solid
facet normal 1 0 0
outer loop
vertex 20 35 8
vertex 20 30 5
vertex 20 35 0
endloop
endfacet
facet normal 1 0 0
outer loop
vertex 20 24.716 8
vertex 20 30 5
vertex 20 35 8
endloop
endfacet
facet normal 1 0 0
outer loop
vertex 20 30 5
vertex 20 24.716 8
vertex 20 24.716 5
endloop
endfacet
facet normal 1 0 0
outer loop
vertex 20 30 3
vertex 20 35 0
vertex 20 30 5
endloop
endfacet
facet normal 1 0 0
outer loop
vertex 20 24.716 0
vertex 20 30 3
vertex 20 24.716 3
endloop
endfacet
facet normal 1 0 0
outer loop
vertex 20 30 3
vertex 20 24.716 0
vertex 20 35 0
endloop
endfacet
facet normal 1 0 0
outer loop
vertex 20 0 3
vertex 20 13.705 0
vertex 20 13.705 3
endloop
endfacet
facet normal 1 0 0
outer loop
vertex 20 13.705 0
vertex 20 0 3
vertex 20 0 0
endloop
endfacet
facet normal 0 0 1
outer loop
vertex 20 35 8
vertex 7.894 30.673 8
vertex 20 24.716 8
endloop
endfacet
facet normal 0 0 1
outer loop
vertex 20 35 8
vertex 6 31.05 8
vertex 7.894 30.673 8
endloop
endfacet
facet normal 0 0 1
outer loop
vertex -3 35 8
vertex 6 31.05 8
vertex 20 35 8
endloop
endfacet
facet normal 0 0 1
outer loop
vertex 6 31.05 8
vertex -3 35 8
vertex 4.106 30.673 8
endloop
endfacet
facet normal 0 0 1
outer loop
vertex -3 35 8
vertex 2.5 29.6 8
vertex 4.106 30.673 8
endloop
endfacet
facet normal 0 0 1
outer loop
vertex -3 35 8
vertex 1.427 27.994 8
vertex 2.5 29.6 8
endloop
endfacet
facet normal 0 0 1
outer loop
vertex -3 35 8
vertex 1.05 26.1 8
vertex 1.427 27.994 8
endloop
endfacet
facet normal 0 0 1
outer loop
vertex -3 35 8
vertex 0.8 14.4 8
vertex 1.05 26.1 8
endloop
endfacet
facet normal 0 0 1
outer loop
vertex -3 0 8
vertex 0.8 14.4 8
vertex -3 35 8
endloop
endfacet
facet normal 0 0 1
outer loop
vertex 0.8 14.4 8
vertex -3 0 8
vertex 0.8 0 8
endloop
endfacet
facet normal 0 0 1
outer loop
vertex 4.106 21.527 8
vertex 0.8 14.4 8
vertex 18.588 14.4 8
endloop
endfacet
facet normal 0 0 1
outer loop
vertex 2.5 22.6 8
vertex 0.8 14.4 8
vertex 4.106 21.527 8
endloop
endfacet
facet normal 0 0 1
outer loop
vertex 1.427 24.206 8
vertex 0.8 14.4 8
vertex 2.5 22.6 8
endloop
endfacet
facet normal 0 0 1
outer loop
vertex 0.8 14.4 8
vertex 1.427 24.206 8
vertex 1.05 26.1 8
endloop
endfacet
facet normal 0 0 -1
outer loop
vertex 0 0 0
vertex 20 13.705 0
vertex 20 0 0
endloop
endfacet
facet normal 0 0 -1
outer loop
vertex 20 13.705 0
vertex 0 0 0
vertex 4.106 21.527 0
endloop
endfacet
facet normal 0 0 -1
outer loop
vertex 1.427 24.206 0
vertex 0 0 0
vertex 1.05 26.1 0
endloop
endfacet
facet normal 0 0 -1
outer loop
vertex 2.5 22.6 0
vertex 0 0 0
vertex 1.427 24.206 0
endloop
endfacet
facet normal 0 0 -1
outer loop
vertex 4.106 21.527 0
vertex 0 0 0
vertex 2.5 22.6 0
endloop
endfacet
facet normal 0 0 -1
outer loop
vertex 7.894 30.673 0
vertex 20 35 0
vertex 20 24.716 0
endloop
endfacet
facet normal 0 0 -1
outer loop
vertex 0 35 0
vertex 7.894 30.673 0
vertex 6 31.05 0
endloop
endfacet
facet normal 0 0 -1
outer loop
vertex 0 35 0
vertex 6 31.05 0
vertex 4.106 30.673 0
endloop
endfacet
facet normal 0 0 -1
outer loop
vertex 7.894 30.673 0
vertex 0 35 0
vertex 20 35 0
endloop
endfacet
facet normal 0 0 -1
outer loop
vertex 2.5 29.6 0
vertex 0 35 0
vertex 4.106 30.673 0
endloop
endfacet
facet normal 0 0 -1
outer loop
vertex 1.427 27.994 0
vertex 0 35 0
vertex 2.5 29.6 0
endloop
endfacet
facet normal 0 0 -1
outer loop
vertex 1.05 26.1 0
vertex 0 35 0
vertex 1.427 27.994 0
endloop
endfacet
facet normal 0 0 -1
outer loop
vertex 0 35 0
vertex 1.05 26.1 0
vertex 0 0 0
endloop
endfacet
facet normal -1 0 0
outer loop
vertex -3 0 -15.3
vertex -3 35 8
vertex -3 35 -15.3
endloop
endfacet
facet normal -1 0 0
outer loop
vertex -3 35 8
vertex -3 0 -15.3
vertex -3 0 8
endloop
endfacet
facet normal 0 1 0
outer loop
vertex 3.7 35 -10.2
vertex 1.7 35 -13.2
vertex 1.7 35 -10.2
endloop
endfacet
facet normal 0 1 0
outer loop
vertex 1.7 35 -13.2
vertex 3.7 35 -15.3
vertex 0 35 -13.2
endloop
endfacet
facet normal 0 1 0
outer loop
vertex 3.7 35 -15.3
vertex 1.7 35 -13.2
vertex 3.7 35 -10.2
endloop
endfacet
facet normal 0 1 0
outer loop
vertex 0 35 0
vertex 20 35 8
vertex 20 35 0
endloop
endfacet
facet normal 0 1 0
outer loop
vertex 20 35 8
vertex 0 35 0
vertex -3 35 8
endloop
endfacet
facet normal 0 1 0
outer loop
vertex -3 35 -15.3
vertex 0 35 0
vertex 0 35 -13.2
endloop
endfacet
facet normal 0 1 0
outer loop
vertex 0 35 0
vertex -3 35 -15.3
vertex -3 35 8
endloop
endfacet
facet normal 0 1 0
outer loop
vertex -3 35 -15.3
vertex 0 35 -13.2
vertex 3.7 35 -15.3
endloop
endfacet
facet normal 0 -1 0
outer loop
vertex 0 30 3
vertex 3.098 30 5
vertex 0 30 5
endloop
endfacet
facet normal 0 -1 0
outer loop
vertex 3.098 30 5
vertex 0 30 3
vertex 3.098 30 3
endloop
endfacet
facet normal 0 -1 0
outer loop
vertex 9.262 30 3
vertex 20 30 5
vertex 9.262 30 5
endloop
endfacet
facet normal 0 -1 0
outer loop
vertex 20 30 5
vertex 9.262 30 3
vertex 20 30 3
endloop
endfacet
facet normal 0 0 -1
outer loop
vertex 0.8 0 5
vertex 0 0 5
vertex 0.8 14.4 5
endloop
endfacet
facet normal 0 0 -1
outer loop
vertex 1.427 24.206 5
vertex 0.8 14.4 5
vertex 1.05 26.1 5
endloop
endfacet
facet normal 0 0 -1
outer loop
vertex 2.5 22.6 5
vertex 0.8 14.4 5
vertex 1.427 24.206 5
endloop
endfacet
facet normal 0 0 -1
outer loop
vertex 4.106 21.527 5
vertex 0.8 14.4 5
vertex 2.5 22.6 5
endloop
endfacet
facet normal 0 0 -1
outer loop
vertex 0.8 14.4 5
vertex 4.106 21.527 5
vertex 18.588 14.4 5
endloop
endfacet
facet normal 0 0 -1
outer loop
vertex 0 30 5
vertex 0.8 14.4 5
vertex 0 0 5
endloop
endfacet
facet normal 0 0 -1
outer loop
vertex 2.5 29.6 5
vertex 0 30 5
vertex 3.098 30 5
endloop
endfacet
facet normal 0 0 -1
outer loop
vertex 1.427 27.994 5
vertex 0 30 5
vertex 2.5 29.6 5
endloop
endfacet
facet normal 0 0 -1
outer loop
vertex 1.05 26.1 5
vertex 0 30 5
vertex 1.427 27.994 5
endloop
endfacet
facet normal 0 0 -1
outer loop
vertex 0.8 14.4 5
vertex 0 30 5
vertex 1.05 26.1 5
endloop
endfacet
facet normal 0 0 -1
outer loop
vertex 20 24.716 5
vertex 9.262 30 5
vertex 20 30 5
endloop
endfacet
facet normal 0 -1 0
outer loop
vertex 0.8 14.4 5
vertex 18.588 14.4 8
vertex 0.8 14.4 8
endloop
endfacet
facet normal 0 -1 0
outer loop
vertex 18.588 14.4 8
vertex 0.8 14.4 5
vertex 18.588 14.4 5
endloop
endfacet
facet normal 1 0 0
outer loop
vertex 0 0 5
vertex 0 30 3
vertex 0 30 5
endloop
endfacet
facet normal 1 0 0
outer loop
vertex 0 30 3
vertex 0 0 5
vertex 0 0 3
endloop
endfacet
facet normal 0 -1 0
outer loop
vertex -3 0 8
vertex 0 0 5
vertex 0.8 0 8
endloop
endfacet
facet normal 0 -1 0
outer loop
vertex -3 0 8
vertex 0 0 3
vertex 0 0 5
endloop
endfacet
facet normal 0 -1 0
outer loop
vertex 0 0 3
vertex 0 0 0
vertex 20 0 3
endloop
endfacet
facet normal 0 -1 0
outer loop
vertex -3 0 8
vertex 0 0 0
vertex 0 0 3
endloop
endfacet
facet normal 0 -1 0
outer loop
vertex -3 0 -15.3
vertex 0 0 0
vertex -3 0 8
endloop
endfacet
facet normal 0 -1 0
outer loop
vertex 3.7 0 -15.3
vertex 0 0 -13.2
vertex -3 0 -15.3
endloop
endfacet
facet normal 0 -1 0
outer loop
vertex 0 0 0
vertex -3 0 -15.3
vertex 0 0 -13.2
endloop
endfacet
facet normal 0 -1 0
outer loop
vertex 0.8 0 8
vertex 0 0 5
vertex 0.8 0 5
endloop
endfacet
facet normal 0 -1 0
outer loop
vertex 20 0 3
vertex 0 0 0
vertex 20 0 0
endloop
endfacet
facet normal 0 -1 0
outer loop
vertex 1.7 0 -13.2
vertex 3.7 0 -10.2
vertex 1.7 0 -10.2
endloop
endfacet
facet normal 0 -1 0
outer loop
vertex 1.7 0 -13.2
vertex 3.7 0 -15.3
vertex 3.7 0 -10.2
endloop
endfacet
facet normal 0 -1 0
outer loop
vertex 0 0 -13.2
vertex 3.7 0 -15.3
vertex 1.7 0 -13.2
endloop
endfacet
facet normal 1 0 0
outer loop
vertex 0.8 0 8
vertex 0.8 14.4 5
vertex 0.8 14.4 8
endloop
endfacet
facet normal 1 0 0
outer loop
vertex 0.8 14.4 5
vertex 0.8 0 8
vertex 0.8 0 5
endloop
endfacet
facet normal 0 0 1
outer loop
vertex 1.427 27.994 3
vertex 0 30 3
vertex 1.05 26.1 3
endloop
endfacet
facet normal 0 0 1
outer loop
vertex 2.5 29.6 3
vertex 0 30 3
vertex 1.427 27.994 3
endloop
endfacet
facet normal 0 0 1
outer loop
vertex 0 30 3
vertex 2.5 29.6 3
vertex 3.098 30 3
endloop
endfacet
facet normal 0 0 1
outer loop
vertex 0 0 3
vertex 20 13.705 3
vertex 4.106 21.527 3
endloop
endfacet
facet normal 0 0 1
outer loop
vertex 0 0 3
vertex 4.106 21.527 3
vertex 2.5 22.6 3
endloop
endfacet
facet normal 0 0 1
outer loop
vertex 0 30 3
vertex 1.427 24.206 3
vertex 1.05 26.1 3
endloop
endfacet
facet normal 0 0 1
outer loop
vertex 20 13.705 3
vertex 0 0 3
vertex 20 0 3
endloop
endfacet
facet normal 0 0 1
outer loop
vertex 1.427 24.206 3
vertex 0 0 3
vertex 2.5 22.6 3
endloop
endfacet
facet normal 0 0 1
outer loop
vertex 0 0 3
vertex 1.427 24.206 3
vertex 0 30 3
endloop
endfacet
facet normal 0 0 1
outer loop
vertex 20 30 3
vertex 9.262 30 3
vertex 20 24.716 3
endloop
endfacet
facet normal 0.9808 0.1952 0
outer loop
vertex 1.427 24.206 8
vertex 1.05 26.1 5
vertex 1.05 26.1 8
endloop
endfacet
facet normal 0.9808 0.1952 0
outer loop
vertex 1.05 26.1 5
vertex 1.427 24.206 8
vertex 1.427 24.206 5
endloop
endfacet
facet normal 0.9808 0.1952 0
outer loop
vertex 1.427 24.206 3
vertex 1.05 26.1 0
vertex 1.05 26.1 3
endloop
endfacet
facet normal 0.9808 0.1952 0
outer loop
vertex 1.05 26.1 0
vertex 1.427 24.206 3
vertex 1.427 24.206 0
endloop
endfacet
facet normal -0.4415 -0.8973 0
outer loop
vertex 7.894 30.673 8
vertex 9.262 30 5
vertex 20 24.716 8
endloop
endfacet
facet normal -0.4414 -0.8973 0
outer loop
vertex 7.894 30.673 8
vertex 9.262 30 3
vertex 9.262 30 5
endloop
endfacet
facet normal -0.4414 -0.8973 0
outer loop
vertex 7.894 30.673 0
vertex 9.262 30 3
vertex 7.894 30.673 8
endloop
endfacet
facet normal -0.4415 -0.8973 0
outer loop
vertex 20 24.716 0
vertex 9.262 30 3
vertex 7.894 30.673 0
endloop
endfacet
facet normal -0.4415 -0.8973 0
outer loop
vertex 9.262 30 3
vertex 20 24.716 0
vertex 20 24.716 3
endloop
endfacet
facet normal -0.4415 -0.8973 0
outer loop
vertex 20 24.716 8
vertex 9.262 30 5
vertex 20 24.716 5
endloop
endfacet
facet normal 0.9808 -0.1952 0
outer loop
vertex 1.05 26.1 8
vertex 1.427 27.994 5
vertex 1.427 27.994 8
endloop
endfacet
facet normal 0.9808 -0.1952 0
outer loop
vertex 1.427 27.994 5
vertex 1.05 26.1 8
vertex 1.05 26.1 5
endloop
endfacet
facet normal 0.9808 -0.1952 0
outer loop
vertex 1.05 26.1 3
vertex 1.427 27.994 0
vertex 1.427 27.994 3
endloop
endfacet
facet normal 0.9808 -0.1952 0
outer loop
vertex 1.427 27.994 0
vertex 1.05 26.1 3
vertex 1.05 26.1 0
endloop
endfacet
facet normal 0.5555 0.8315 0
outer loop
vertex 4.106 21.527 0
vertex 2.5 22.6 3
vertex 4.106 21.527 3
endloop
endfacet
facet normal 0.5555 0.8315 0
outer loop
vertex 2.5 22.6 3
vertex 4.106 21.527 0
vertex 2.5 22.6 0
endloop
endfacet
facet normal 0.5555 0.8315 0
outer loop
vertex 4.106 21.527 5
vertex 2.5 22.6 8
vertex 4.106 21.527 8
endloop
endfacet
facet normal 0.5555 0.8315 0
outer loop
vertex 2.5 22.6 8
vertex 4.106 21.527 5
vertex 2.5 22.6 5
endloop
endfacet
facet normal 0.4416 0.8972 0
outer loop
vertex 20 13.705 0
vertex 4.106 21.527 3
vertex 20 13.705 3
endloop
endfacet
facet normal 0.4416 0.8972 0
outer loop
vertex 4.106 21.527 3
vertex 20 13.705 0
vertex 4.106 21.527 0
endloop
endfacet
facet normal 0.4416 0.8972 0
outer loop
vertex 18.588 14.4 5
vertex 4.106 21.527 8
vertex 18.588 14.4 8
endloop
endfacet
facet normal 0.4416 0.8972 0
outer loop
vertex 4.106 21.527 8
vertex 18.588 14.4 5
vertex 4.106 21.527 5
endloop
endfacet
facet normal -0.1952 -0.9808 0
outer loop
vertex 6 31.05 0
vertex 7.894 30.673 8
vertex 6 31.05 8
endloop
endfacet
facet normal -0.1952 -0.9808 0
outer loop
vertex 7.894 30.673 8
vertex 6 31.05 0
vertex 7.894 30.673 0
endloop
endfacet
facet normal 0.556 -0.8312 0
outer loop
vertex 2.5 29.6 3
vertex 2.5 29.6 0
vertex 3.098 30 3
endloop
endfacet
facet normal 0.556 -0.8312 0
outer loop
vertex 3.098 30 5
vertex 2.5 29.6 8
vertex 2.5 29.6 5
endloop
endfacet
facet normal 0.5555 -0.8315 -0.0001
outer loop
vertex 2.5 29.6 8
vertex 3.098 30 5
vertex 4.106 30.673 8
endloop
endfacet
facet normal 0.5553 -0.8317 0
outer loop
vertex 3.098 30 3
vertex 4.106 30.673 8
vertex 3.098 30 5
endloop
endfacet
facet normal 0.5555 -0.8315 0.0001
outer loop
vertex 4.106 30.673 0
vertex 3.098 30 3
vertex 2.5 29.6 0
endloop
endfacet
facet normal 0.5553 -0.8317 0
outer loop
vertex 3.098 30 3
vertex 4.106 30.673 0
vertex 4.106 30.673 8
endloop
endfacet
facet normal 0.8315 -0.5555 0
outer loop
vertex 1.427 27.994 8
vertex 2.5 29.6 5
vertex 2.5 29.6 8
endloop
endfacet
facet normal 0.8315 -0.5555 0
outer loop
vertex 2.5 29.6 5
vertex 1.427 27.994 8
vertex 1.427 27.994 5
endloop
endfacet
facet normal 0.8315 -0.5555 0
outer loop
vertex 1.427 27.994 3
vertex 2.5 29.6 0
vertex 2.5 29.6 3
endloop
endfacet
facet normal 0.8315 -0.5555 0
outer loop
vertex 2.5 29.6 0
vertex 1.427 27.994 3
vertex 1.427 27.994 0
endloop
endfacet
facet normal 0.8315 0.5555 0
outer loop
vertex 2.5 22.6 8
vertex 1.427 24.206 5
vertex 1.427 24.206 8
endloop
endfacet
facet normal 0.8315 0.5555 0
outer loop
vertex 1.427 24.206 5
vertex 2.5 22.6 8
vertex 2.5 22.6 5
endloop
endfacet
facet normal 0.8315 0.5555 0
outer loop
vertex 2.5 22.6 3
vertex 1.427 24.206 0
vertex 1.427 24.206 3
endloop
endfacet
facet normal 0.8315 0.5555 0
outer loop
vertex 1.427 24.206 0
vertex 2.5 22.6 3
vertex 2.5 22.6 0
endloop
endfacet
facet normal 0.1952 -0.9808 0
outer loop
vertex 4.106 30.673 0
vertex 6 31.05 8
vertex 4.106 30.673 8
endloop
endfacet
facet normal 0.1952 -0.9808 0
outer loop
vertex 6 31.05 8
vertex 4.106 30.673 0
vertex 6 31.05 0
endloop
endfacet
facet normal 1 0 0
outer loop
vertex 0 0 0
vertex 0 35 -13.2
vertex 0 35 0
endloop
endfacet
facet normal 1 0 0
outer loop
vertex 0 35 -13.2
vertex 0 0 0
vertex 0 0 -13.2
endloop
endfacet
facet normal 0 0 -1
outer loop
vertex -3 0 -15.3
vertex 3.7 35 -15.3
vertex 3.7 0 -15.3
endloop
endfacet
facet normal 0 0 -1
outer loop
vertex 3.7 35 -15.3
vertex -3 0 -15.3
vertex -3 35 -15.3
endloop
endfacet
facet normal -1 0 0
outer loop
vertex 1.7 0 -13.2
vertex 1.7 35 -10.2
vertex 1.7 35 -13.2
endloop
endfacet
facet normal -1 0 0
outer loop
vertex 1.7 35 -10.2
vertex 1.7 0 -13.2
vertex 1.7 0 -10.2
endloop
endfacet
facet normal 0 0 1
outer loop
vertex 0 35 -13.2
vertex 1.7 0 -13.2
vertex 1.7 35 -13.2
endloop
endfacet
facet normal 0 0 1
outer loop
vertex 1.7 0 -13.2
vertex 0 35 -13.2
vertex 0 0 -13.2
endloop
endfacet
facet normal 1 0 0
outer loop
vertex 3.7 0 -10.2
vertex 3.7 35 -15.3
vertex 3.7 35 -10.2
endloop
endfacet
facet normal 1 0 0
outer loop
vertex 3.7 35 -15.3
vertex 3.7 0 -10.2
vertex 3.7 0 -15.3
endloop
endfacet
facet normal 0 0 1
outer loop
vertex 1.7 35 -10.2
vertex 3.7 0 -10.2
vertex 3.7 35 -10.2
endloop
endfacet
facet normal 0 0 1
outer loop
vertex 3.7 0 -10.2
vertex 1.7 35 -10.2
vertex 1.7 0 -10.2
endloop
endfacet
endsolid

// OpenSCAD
// OpenSCAD model by tselling
// dimensions in mm

// Glass clips for Monoprice Select Mini 3D Printer.  Currently
// setup for BACK LEFT corner... the FRONT RIGHT corner should
// be the same.  Note the clips squeeze against the glass plate,
// they do not clip over the top.  Changing doOppositeCorners to 1
// will do the BACK RIGHT & FRONT LEFT corners.  To  make a tight 
// fit estimate the plate is slightly smaller (... you can always 
// sand to make fit if slightly too tight.  Currently setup for 
// 130mmx130mmx3mm glass plate.  
// Commented glass values should work for 140mmx140mmx3mm plate.

fn=20;

// Change this variable for opposite corners (1 vs 0)
doOppositeCorners=0;

// (mm) thickness of glass plate
glassThickness=3.0;

// (mm) distance to glass from back - neg for smaller plate
glassBack=-15.6;
// glassBack = -10.6;

// (mm) distance to glass from left side - neg for smaller plate
glassSide=-0.8;
// glassSide = -6.0;

// (mm) length (X) of the base (underneath plate)
baseBack = 20;

// (mm) depth (Y) of the base (underneath plate)
baseSide = 30;

// (mm) thickness of the base of the clip 
baseThickness=3.0;

// (mm) adjust thickness of the wall of the clip
backWall=5.0;

// (mm) adjust thickness of the wall of the clip
sideWall=3.0;

// (mm) thickness of build plate without glass
plateThickness=2.0;

// (mm) diameter of hole needed in base for leveling screw + spring
screwDiameter=9.9;

// (mm) distance from back to screw center & averaged with front
screwBack = 3.9;

// (mm) measured from left side to screw center
screwSide = 6;

// (mm) Height from bottom of plate to bottom lip
latchHeight = 16.2;

// (mm) inside catch height...depress plate to latch/unlatch
latchCatch = 3.0;

// (mm) inside catch thickness
latchInside = 2.0;

// (mm) bottom of latch thickness
latchUnder = 2.1;

// (mm) thickness of the plate lip
latchDepth = 1.7;

totalHeight = baseThickness+plateThickness+glassThickness; 
plateHeight = baseThickness+plateThickness; 

union() {    
difference() {
union() {
    
// base
translate([0,0,0]) cube([baseBack,baseSide,baseThickness]);
   
plusX = glassSide > 0 ? glassSide : 0; 
xLength = baseBack + sideWall + plusX;
x = doOppositeCorners == 0 ? -sideWall-plusX : 0;
if ( glassBack <= 0 ) {
// Wall along X Axis
translate([x,baseSide,0]) 
    cube([xLength,backWall,totalHeight]);
// Tab along X Axis
translate([x,baseSide+glassBack,plateHeight])
    cube([xLength,backWall-glassBack,glassThickness]);
} else {
    // Extend base first--high enough for glass to sit on
    translate([x,baseSide,0])
        cube([xLength,glassBack,plateHeight]);
    // Now add wall to hold glass
    translate([x,baseSide+glassBack,0])
        cube([xLength,backWall,totalHeight]);
}

// Wall along Y axis
yLength = glassBack>0 ? baseSide+wallThickness+glassBack : baseSide+backWall;
if ( glassSide <= 0 ) { // Glass shorter at side 
    x1 = doOppositeCorners == 0 ? -sideWall : baseBack;
    x2 = doOppositeCorners == 0 ? -sideWall : baseBack+glassSide; 
    // Wall along Y Axis
    translate([x1,0,0])
        cube([sideWall,yLength,totalHeight]);
    // Tab along Y Axis    
    translate([x2,0,plateHeight])
        cube([sideWall-glassSide,yLength,glassThickness]);   
} else {  // Glass bigger at side
    x1 = doOppositeCorners == 0 ? -glassSide-sideWall : baseBack;
    x2 = doOppositeCorners == 0 ? -glassSide-sideWall : baseBack+glassSide;
    // Extend base first-- high enough for glass to sit on
    translate([x1,0,0])
        cube([backWall+glassSide,yLength,plateHeight]);
    // Now add wall to hold glass
    translate([x2,0,0])
        cube([backWall,yLength,totalHeight]);
} //else

} // union

// add slot for leveling screw & spring
x1 = doOppositeCorners == 0 ? screwSide : baseBack-screwSide;
x2 = doOppositeCorners == 0 ? baseBack*6 : -baseBack*5;
    hull() {
        translate([x1,baseSide-screwBack,0])
            cylinder(h=totalHeight,d=screwDiameter);
        translate([x2,-baseSide,0])
            cylinder(h=totalHeight,d=screwDiameter);

} // hull

} // difference

// Add latch 
ll = baseSide + backWall;
lh = latchHeight - baseThickness;
ly = 0;
x1 = doOppositeCorners == 0 ? -sideWall : baseBack;
x2 = doOppositeCorners == 0 ? -sideWall : baseBack-latchDepth;
x3 = doOppositeCorners == 0 ? latchDepth : baseBack-latchDepth-latchInside;

translate([x1,ly,-lh-latchUnder])
    cube([sideWall, ll, lh+latchUnder]);
translate([x2,ly,-lh-latchUnder])
    cube([sideWall+latchDepth, ll, latchUnder]);
translate([x3,ly,-lh-latchUnder])
    cube([latchInside, ll, latchCatch+latchUnder]);

} // union
